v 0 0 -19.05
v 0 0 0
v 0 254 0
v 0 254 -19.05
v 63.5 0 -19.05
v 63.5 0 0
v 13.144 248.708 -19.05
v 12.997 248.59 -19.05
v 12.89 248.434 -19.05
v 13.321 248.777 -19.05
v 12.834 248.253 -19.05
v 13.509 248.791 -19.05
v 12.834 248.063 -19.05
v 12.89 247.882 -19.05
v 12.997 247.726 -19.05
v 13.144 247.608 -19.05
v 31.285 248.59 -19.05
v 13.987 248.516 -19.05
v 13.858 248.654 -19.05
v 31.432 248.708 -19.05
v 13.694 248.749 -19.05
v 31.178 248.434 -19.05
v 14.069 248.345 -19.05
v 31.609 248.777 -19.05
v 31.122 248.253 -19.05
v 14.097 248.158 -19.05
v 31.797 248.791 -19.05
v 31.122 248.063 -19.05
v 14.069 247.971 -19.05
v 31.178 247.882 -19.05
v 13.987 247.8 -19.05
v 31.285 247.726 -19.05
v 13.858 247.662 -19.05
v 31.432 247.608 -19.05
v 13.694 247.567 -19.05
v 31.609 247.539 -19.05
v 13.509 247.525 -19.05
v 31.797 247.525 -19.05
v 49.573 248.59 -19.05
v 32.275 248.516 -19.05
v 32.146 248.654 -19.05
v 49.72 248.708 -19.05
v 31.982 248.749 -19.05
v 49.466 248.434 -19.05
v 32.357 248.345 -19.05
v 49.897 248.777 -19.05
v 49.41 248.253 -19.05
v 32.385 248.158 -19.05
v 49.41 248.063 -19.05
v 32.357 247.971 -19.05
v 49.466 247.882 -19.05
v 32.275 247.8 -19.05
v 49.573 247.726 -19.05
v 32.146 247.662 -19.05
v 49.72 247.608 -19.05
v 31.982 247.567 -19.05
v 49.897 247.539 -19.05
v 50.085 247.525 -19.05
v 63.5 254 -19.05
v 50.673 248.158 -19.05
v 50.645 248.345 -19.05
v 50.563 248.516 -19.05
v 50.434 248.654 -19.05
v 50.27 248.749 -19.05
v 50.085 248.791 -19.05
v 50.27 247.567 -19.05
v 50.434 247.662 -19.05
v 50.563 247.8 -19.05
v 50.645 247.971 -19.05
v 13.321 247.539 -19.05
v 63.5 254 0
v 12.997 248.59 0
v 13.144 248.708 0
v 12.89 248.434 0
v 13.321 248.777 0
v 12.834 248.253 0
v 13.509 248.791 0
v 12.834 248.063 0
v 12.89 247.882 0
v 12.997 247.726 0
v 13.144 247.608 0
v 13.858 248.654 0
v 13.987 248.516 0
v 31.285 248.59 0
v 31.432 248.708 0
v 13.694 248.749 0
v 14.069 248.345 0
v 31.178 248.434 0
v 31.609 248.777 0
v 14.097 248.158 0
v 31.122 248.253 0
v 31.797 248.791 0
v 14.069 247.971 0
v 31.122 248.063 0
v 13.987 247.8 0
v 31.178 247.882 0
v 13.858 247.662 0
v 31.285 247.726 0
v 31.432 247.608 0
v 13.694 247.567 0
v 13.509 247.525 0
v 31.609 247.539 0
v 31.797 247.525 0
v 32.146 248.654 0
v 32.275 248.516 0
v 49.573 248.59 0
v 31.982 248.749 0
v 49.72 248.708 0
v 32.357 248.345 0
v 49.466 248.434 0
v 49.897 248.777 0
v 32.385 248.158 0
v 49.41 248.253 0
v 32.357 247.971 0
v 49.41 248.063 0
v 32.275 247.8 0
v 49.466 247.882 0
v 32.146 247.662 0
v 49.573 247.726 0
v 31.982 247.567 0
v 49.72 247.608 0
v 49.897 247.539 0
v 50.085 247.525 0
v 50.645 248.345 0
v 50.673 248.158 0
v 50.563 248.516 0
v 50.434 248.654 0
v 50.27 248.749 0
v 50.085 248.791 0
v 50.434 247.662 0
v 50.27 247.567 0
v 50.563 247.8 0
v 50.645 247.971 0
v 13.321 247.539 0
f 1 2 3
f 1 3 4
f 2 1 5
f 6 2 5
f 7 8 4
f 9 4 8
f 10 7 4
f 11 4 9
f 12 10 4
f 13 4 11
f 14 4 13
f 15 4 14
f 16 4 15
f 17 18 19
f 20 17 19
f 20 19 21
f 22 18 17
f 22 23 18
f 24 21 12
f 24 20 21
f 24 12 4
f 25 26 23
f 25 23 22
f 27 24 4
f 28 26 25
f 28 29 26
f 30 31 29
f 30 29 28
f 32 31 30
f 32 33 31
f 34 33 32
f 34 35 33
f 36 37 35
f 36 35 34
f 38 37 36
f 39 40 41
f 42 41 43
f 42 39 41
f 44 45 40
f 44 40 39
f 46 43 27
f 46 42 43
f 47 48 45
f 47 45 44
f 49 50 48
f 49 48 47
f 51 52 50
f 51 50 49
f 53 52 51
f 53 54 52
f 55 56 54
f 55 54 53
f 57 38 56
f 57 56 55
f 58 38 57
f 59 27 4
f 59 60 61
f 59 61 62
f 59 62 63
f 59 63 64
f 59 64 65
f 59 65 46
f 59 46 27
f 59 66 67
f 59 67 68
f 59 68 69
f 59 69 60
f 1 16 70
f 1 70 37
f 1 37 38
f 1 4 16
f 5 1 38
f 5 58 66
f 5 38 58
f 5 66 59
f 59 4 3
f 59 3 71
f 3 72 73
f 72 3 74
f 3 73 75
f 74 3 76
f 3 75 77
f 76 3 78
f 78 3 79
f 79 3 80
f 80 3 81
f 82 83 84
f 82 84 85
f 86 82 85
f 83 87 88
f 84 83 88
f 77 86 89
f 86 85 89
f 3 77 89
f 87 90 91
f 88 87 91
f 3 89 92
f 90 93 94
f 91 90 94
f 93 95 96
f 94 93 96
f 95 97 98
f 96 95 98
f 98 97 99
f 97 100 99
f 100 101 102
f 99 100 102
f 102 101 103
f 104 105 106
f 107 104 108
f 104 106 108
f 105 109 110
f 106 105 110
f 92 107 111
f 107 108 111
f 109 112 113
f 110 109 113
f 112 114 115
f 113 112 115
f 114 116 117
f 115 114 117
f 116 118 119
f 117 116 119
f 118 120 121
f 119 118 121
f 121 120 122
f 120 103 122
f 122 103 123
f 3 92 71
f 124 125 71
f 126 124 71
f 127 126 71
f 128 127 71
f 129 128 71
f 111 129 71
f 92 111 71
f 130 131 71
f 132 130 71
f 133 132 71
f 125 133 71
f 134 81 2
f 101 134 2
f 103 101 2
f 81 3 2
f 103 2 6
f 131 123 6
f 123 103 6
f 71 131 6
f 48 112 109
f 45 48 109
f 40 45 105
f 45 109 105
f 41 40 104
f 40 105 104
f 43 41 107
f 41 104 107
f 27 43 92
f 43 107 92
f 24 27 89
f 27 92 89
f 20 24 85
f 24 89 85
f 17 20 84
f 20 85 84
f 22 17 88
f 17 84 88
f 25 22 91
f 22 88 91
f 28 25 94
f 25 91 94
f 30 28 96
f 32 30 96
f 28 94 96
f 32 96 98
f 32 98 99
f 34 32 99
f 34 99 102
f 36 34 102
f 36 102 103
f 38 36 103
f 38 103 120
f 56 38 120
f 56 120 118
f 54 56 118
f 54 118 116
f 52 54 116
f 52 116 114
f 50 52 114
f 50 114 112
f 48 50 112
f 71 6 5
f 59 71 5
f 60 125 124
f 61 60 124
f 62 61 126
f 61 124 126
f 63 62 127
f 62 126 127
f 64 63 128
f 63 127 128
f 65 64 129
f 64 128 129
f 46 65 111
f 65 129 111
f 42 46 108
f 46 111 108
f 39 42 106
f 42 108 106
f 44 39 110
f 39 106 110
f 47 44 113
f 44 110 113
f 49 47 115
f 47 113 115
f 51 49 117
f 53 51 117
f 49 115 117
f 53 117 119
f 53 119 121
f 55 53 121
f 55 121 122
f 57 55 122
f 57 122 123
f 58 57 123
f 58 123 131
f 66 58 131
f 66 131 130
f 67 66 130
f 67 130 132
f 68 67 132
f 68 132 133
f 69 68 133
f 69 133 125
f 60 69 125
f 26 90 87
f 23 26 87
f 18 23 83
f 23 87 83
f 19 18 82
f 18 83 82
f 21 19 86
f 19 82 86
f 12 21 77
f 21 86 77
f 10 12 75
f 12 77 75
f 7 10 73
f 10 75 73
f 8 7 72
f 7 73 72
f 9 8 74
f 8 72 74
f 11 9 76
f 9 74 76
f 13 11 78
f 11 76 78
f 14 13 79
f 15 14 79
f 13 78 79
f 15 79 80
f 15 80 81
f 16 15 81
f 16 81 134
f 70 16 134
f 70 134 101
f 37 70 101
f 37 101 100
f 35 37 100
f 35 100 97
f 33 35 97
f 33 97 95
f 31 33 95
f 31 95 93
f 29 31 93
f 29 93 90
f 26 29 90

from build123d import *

# Parameters (mm, degrees)
SKETCH1_W           = 63.5
SKETCH1_H           = 19.05
BOSS_EXTRUDE1_DEPTH = 254
SKETCH2_R           = 0.635
CUT_EXTRUDE1_DEPTH  = 263.509337929


with BuildPart() as part:
    # Sketch1 → Boss-Extrude1 (new body)
    with BuildSketch(Plane(origin=(0, 0, 0), x_dir=(1, 0, 0), z_dir=(0, 1, 0))):
        with Locations((31.75, 9.525)):
            Rectangle(SKETCH1_W, SKETCH1_H)
    extrude(amount=BOSS_EXTRUDE1_DEPTH)

    # Sketch2 → Cut-Extrude1 (cut, through all)
    with BuildSketch(Plane.XY):
        with Locations((13.462, 248.158)):
            Circle(SKETCH2_R)
        with Locations((31.75, 248.158)):
            Circle(SKETCH2_R)
        with Locations((50.038, 248.158)):
            Circle(SKETCH2_R)
    extrude(amount=-CUT_EXTRUDE1_DEPTH, mode=Mode.SUBTRACT)


solid = part.part
